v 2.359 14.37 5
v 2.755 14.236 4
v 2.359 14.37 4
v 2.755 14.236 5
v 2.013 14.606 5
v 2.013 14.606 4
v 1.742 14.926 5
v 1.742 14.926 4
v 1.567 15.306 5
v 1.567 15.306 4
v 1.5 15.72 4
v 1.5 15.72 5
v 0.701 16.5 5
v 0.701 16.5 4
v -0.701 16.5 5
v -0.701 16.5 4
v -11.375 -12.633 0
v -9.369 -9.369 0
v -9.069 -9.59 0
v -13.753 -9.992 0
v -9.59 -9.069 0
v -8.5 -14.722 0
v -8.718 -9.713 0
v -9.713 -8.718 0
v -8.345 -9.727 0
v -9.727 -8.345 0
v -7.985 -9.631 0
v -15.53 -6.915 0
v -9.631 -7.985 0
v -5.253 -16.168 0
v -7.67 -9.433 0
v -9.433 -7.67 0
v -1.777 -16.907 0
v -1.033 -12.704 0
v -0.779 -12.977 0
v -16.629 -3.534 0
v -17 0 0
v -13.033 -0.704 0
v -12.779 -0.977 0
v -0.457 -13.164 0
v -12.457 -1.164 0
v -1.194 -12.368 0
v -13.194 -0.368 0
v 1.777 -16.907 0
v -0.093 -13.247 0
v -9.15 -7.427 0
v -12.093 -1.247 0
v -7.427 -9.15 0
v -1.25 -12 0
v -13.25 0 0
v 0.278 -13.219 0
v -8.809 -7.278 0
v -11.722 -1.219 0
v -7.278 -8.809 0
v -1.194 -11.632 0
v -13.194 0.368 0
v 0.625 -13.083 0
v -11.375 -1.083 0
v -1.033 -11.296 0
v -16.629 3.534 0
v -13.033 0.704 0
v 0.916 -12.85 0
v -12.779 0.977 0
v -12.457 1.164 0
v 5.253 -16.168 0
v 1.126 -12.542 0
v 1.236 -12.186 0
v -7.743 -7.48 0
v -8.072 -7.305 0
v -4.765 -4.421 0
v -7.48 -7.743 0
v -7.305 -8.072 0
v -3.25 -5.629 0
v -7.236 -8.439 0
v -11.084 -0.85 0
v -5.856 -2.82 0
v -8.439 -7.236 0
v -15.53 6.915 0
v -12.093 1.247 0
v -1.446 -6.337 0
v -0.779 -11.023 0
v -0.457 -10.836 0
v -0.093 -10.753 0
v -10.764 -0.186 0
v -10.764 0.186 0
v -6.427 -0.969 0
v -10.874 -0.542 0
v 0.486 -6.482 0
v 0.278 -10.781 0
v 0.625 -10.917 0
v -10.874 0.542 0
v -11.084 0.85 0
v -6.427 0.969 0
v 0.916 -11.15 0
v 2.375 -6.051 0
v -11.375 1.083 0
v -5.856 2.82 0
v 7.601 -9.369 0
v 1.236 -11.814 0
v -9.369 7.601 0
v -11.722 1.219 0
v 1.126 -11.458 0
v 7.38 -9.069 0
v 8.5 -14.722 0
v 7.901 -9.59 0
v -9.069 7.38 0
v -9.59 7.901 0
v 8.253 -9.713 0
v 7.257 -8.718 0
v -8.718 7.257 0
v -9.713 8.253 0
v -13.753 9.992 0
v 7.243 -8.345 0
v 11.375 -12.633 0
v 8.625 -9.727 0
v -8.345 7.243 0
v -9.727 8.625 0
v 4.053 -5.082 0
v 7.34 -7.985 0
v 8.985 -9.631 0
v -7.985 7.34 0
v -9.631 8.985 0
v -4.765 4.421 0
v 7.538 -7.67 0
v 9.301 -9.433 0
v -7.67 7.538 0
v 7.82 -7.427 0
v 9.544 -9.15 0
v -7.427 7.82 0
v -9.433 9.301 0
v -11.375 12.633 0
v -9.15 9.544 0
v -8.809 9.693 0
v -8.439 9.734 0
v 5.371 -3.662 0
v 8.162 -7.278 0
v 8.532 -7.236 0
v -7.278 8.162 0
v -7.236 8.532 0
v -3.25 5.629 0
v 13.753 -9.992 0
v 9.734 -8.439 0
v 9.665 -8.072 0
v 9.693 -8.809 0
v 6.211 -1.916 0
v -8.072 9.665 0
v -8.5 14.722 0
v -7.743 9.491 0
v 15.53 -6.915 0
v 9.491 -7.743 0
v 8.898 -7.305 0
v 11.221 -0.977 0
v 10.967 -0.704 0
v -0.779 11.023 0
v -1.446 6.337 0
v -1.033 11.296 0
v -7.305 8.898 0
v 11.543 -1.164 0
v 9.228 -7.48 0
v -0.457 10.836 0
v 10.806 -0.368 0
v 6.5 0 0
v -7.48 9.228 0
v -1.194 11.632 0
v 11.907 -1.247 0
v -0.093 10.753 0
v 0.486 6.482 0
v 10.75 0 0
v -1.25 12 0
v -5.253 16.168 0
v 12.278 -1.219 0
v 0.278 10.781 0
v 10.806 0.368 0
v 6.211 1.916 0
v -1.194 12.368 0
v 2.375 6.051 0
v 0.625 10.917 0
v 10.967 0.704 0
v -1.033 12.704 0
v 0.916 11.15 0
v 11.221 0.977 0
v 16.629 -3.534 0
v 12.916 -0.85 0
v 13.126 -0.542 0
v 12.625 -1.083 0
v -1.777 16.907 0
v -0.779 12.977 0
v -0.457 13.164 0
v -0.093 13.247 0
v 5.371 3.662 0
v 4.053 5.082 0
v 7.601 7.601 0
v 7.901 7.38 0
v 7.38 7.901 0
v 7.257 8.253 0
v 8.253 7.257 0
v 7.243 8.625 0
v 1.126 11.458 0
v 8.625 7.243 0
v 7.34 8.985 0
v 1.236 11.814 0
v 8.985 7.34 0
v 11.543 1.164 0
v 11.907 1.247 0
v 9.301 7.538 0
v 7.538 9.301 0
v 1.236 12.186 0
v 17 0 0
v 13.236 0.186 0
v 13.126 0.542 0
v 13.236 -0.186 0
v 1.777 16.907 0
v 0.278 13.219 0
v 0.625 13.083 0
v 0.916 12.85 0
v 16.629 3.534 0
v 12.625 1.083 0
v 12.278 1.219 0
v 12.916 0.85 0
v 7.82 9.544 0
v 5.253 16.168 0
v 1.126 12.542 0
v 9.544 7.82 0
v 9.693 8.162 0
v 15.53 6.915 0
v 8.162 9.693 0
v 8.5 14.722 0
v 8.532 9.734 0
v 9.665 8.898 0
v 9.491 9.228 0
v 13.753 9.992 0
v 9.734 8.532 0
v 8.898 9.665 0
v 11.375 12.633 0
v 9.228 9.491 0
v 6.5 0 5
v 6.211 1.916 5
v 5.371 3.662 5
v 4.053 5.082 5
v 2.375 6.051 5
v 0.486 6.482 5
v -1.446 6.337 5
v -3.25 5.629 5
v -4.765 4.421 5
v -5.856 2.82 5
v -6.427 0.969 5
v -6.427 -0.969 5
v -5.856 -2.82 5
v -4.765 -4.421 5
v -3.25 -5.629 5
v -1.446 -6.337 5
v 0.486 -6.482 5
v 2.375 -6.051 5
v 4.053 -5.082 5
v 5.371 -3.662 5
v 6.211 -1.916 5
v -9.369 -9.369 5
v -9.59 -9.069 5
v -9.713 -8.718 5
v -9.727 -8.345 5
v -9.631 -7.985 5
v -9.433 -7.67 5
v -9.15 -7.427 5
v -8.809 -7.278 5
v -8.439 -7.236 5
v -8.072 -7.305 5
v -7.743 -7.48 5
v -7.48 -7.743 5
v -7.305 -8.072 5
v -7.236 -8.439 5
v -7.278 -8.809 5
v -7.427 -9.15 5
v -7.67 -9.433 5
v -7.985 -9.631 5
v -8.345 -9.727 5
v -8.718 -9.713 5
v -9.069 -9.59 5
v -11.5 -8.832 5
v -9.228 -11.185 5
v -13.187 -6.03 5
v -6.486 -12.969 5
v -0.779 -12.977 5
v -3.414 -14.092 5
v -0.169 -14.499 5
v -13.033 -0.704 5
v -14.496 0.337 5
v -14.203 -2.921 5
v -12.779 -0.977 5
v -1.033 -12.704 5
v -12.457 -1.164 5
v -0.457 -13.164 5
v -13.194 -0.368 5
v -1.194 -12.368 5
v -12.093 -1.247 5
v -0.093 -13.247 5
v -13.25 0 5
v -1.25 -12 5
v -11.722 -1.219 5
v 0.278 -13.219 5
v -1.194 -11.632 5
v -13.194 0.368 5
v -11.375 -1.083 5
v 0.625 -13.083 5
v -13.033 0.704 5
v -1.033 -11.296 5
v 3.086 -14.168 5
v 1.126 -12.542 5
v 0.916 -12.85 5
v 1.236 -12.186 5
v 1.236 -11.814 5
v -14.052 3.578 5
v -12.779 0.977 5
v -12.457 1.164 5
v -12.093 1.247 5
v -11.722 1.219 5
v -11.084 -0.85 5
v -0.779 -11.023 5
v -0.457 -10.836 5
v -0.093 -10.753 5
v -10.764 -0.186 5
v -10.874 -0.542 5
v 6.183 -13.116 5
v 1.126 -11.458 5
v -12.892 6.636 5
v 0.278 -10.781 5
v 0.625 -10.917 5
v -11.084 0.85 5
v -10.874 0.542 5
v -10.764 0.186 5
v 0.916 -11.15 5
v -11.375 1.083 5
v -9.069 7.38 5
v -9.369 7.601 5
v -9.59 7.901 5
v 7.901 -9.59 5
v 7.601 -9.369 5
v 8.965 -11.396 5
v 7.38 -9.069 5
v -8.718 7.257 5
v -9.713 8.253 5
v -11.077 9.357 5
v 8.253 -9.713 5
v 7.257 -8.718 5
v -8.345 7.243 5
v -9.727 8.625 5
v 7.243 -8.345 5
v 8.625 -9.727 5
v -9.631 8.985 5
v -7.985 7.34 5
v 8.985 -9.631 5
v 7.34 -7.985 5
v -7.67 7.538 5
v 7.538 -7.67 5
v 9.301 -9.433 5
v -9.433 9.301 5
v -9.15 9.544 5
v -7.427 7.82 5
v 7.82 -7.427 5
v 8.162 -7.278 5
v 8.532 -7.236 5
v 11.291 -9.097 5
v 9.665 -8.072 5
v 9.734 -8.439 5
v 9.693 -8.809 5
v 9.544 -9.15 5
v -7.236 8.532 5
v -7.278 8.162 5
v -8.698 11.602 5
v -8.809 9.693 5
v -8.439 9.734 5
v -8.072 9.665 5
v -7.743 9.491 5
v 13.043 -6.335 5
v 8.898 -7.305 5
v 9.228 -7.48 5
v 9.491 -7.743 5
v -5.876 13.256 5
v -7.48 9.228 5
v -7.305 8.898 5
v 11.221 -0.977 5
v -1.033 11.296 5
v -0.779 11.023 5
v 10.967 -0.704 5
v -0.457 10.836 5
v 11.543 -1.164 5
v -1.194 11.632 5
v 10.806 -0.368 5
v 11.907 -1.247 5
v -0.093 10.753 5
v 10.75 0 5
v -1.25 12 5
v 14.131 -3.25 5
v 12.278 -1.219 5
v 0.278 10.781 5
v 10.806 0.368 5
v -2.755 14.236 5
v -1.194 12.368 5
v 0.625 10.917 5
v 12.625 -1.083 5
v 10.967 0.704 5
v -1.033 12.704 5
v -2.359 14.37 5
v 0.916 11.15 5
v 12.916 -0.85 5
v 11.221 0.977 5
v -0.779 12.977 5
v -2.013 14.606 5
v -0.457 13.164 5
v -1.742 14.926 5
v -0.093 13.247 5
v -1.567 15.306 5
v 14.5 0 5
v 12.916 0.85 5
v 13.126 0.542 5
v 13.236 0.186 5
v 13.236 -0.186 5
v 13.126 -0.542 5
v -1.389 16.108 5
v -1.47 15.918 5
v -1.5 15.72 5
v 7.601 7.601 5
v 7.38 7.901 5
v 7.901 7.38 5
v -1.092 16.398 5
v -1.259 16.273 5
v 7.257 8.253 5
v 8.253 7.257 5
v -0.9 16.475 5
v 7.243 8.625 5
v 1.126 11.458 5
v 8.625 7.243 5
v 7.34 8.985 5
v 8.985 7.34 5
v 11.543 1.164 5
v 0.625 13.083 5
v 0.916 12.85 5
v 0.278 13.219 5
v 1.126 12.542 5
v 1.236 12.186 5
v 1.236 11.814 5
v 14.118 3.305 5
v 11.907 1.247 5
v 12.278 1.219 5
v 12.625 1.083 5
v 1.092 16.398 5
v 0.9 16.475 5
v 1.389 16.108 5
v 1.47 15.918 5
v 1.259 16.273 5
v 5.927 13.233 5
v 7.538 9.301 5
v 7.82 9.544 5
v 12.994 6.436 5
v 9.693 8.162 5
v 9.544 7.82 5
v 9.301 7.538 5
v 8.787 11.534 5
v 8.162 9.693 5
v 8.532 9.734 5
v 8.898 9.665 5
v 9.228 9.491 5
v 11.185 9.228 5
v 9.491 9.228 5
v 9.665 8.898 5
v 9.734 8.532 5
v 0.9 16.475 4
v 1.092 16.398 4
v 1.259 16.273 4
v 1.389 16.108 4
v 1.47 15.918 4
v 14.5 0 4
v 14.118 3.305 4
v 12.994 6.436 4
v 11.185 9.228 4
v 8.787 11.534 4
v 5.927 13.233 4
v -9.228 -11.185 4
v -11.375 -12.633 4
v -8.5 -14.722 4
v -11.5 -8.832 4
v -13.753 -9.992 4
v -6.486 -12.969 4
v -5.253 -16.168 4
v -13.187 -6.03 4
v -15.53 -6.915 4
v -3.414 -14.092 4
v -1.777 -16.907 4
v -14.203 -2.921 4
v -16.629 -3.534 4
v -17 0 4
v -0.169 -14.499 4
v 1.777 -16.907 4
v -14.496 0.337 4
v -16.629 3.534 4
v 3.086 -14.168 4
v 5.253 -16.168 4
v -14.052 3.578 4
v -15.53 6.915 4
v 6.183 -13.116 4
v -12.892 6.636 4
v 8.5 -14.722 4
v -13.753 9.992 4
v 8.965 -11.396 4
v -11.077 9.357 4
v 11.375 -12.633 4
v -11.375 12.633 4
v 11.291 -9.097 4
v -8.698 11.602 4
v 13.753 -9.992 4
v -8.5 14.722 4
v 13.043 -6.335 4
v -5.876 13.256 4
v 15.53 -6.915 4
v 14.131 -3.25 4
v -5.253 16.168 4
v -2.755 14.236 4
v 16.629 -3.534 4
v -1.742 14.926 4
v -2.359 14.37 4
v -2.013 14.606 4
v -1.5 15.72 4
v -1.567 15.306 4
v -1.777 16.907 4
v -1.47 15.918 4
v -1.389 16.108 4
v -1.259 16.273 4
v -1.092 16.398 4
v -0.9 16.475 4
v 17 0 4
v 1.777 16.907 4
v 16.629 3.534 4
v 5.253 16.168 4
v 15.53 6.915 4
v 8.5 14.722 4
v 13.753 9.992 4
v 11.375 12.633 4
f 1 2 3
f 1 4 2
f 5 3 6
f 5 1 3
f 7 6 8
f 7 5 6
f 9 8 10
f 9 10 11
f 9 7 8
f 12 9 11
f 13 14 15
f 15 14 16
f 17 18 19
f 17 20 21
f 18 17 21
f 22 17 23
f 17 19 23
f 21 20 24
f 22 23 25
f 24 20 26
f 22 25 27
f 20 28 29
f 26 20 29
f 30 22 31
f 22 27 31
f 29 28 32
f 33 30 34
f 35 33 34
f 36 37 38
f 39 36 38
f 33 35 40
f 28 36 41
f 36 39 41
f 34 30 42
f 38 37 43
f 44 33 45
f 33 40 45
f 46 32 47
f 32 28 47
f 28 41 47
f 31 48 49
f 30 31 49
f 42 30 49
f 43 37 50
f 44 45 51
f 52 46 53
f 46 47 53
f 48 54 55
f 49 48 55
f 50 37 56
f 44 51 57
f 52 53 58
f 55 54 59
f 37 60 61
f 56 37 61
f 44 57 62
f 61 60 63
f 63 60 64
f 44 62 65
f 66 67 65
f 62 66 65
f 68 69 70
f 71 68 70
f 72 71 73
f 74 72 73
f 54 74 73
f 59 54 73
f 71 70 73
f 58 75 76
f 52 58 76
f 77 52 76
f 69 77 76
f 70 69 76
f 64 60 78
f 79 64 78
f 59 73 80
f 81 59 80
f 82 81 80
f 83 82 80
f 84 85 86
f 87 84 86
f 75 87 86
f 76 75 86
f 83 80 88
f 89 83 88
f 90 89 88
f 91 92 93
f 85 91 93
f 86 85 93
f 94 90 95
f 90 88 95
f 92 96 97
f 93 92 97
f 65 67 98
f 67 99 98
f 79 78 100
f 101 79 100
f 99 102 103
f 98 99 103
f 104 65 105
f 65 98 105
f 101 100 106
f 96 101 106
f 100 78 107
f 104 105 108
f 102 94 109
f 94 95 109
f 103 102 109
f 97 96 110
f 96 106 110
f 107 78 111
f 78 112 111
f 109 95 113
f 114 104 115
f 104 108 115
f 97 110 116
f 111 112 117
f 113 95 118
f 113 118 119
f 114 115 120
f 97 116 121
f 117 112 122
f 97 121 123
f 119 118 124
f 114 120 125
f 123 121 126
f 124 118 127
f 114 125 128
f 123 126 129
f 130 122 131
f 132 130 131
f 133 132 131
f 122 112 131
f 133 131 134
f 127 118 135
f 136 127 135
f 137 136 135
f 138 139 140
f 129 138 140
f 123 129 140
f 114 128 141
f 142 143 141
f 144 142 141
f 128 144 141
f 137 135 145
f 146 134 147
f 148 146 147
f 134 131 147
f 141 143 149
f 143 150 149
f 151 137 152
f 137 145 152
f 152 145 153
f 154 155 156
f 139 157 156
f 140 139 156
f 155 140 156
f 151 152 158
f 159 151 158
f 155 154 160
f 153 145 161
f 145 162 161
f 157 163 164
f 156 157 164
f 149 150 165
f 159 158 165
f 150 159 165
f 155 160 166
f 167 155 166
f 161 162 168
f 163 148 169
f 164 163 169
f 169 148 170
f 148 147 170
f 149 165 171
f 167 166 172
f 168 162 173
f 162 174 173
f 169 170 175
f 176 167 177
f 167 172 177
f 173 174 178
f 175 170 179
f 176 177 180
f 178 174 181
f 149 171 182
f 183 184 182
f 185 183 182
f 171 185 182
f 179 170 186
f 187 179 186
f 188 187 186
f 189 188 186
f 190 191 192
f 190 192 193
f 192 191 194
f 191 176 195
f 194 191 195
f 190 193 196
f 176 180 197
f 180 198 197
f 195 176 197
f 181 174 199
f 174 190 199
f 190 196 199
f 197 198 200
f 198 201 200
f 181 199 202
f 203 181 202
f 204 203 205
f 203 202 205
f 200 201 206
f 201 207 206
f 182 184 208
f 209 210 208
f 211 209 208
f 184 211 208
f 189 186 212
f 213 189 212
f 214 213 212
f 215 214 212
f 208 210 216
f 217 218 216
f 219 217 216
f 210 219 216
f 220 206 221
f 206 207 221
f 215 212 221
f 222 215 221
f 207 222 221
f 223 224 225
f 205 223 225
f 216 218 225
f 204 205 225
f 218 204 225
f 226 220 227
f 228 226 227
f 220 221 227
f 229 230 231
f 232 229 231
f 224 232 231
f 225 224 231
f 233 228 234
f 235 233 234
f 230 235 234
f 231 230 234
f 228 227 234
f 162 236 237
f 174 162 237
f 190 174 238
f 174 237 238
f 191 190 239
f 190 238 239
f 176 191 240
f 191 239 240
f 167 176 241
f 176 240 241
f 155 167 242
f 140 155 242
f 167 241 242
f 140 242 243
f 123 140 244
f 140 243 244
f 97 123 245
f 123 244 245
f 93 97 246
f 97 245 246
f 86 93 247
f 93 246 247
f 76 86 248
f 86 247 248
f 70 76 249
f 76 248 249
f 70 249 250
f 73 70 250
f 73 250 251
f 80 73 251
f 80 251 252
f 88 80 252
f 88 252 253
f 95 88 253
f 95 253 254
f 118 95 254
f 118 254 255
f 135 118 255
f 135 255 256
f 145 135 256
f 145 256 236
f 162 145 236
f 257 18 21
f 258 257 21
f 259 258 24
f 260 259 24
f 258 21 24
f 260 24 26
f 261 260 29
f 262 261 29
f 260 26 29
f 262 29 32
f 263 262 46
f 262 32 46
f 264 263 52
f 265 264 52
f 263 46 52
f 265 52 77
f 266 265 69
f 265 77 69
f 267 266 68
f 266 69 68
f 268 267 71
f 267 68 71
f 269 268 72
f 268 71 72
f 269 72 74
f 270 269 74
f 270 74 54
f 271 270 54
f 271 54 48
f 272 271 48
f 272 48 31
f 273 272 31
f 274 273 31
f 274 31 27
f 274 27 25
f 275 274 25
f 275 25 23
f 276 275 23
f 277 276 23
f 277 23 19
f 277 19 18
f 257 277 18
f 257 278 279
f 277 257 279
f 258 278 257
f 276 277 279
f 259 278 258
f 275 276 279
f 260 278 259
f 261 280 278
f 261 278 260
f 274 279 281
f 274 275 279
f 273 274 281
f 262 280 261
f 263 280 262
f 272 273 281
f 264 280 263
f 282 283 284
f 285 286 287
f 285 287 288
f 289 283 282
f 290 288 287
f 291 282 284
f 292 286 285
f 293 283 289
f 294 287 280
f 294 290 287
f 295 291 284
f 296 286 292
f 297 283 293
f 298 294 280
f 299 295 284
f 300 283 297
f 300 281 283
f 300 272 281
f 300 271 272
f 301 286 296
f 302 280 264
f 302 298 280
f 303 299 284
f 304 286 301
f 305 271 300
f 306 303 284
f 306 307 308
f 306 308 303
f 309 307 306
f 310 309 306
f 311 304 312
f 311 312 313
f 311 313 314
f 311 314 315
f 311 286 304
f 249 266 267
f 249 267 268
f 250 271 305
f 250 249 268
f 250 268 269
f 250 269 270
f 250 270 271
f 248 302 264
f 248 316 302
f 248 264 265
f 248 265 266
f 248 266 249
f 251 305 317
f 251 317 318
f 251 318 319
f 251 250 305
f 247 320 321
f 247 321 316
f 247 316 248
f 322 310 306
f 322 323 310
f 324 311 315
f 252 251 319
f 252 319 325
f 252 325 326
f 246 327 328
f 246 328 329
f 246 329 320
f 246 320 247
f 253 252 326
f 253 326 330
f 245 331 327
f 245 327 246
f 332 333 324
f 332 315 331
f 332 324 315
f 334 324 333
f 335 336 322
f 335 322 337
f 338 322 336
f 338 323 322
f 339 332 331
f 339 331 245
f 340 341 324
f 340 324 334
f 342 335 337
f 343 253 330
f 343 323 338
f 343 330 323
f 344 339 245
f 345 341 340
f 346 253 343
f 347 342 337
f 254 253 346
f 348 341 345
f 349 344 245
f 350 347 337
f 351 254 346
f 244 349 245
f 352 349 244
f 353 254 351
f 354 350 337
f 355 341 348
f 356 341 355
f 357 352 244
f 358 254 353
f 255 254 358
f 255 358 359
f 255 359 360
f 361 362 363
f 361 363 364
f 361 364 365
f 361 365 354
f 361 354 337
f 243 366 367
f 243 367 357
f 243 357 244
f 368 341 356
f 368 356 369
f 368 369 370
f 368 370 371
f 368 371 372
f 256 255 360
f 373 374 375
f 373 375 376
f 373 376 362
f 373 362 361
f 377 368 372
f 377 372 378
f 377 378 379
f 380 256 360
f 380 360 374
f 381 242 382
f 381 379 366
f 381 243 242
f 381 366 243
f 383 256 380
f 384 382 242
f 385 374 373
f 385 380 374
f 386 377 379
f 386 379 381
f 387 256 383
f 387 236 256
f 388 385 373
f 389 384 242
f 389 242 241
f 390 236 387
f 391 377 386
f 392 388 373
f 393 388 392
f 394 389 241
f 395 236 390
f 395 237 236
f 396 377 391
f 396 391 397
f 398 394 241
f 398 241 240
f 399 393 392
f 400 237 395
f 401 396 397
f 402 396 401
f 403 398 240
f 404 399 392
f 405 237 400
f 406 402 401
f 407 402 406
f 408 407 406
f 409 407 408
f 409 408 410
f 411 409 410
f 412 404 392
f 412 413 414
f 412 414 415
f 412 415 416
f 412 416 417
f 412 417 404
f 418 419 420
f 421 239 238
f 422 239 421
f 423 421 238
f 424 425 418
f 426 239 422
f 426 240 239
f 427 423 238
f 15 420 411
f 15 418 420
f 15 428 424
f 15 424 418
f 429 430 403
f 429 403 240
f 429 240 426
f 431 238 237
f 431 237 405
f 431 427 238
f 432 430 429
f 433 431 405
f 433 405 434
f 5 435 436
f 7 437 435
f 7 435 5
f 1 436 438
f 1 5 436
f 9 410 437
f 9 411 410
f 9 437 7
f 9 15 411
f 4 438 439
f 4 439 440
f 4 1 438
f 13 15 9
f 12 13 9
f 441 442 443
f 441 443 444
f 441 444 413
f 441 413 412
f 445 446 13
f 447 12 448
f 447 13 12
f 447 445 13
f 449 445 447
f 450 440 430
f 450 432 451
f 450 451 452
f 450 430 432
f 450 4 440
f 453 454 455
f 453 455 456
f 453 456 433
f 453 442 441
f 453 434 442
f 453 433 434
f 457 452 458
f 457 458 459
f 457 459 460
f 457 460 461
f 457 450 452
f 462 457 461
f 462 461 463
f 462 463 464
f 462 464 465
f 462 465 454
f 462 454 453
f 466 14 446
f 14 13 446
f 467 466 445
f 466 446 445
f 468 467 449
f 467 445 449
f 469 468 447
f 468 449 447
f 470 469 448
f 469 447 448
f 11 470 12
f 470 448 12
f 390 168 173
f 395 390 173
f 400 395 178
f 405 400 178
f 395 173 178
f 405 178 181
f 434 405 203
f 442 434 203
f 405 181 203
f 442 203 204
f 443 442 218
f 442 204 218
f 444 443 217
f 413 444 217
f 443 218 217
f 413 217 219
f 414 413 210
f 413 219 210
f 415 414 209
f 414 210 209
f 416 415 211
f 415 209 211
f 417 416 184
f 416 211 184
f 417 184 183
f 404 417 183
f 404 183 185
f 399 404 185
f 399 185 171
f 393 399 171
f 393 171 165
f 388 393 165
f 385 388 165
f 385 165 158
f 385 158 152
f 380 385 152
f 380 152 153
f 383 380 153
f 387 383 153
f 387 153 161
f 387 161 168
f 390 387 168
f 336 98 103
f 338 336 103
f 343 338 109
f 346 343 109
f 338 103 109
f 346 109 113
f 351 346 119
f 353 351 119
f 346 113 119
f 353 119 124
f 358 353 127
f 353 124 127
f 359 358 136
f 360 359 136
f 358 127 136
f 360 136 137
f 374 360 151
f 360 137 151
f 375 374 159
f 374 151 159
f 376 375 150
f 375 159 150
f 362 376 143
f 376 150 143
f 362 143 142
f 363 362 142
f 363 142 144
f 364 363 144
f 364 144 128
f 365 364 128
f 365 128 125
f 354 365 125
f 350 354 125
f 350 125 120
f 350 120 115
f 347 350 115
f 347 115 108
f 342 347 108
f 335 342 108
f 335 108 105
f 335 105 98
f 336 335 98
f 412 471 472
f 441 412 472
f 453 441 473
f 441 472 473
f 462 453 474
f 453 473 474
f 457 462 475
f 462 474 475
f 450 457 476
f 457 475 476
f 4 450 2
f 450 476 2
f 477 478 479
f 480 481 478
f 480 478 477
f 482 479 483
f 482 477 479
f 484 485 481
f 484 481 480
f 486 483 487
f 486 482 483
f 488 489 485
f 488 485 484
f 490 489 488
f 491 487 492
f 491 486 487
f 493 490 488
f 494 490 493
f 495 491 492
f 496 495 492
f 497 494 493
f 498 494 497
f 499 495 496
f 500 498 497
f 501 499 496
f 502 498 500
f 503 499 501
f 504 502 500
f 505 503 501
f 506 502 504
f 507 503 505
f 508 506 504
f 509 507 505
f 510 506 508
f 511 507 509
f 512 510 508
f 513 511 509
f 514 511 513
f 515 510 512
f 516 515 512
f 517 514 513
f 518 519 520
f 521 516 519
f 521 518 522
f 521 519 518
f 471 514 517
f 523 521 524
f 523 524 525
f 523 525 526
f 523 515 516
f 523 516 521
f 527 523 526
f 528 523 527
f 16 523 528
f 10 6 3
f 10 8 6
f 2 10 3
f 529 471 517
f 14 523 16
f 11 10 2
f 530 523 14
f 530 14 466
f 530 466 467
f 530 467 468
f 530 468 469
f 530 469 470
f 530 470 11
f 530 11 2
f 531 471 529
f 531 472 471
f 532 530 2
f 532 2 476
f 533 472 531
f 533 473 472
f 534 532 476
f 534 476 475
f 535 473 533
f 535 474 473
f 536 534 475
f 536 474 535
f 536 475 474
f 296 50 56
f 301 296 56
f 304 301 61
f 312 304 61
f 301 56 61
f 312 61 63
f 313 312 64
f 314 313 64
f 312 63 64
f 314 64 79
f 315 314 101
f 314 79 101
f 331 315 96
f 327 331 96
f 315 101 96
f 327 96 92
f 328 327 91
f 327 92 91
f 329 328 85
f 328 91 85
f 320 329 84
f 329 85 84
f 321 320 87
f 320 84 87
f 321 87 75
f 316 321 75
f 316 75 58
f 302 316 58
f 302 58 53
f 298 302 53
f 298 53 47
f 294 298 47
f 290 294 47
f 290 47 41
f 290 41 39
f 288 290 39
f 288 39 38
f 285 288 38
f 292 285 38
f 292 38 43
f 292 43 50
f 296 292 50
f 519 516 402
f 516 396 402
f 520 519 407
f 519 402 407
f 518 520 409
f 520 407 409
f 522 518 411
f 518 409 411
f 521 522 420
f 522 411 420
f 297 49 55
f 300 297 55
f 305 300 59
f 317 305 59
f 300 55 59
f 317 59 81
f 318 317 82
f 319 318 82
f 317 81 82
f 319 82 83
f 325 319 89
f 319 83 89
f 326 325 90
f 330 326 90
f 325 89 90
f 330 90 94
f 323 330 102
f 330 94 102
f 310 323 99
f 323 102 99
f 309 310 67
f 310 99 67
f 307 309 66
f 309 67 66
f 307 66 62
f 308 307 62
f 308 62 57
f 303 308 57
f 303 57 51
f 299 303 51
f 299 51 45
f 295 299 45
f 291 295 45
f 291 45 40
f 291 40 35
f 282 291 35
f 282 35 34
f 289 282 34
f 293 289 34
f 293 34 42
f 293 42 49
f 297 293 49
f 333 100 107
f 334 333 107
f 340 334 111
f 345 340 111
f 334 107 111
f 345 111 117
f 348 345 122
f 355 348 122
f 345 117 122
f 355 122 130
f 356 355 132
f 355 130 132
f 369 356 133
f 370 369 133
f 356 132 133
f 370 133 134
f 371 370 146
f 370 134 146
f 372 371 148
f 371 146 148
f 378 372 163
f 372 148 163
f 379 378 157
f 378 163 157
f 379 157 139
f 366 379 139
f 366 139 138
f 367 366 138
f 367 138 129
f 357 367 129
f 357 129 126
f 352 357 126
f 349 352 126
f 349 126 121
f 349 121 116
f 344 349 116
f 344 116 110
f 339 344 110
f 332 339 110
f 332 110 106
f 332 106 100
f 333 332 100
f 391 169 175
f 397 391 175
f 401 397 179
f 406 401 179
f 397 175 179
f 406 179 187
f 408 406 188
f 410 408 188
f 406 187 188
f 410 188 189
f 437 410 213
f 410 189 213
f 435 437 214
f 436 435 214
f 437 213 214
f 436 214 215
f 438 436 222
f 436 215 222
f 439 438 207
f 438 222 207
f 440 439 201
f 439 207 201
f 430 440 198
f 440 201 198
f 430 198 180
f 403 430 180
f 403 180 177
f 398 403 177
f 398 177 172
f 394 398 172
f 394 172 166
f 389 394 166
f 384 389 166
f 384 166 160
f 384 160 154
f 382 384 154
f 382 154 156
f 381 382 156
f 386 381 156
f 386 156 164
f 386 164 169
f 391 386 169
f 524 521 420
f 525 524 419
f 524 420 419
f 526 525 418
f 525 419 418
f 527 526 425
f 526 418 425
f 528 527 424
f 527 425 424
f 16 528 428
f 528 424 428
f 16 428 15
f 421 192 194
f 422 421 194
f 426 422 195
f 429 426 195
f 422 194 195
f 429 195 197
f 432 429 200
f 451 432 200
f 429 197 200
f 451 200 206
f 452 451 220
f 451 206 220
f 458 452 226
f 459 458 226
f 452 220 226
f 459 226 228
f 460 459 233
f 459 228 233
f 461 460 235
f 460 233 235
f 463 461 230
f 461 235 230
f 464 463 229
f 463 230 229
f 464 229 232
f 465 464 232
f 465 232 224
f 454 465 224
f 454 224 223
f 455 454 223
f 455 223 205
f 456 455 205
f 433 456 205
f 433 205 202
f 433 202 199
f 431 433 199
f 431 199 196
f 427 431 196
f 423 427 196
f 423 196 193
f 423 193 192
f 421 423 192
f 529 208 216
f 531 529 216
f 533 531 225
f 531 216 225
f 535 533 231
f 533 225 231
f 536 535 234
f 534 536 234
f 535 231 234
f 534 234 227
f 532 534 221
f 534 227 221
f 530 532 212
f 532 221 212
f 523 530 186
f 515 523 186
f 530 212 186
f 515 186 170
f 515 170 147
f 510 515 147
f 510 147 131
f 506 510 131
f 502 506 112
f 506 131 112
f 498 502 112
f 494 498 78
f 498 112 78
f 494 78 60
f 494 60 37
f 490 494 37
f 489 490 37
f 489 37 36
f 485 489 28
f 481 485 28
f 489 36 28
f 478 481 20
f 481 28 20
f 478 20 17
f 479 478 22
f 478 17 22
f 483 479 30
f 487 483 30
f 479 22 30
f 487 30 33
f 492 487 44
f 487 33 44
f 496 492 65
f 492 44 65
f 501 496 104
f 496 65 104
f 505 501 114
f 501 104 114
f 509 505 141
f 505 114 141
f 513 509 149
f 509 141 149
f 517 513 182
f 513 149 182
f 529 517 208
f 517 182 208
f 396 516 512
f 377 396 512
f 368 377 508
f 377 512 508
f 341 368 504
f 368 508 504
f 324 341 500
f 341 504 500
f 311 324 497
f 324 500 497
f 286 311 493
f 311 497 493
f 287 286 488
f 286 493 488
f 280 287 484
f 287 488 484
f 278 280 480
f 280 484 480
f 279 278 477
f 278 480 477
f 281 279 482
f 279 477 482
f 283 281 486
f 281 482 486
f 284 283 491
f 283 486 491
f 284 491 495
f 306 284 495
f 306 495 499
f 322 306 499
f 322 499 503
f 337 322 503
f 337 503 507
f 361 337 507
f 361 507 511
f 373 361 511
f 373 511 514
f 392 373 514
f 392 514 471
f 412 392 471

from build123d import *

# Parameters (mm, degrees)
SKETCH_1_R               = 17
EXTRUDE_1_DEPTH          = 4
EXTRUDE_2_DEPTH          = 1
FILLET_1_R               = 1.55
FILLET_2_R               = 0.8
SKETCH_3_R               = 6.5
CUT_EXTRUDE_1_DEPTH      = 6
SKETCH_4_R               = 1.25
CUT_EXTRUDE_2_DEPTH      = 6.0000001
PATTERN_CIRCULAR_1_COUNT = 2
PATTERN_CIRCULAR_1_ANGLE = 45


with BuildPart() as part:
    # ｽｹｯﾁ1 → ﾎﾞｽ - 押し出し1 (new body)
    with BuildSketch(Plane.XY):
        Circle(SKETCH_1_R)
    extrude(amount=EXTRUDE_1_DEPTH)

    # ｽｹｯﾁ2 → ﾎﾞｽ - 押し出し2 (add)
    with BuildSketch(Plane.XY.offset(4)):
        with BuildLine():
            Line((-1.5, 14.422205102), (-1.5, 12.5))
            Line((-1.5, 12.5), (1.5, 12.5))
            Line((1.5, 12.5), (1.5, 14.422205102))
            ThreePointArc((1.5, 14.422205102), (0, 14.5), (-1.5, 14.422205102))
        make_face()
        with BuildLine():
            Line((1.5, 12.5), (-1.5, 12.5))
            Line((-1.5, 12.5), (-1.5, 14.422205102))
            ThreePointArc((-1.5, 14.422205102), (-9.708243919, -10.770329614), (14.5, 0))
            ThreePointArc((14.5, 0), (10.770329614, 9.708243919), (1.5, 14.422205102))
            Line((1.5, 14.422205102), (1.5, 12.5))
        make_face()
        with BuildLine():
            Line((-1.5, 16.5), (-1.5, 14.422205102))
            ThreePointArc((-1.5, 14.422205102), (0, 14.5), (1.5, 14.422205102))
            Line((1.5, 14.422205102), (1.5, 16.5))
            Line((1.5, 16.5), (-1.5, 16.5))
        make_face()
    extrude(amount=EXTRUDE_2_DEPTH)

    # ﾌｨﾚｯﾄ1
    fillet_1_edges = [part.edges().sort_by_distance(p)[0] for p in [
        (-1.5, 14.422205102, 4.5),
        (1.5, 14.422205102, 4.5),
    ]]
    fillet(fillet_1_edges, radius=FILLET_1_R)

    # ﾌｨﾚｯﾄ2
    fillet_2_edges = [part.edges().sort_by_distance(p)[0] for p in [
        (1.5, 16.5, 4.5),
        (-1.5, 16.5, 4.5),
    ]]
    fillet(fillet_2_edges, radius=FILLET_2_R)

    # ｽｹｯﾁ3 → ｶｯﾄ - 押し出し1 (cut, through all)
    with BuildSketch(Plane.XY.offset(5)):
        Circle(SKETCH_3_R)
    extrude(amount=-CUT_EXTRUDE_1_DEPTH, mode=Mode.SUBTRACT)

    # ｽｹｯﾁ4 → ｶｯﾄ - 押し出し2 (cut, through all)
    with BuildSketch(Plane(origin=(0, 0, 0), x_dir=(-1, 0, 0), z_dir=(0, 0, -1))):
        with Locations((0, 12)):
            Circle(SKETCH_4_R)
        with Locations((12, 0)):
            Circle(SKETCH_4_R)
        with Locations((0, -12)):
            Circle(SKETCH_4_R)
        with Locations((-12, 0)):
            Circle(SKETCH_4_R)
    cut_extrude_2 = extrude(amount=-CUT_EXTRUDE_2_DEPTH, mode=Mode.SUBTRACT)

    # 円形ﾊﾟﾀｰﾝ1: ｶｯﾄ - 押し出し2 ×2 about axis
    pattern_circular_1_axis = Axis((0, 0, 0), (0, 0, 1))
    for i in range(1, PATTERN_CIRCULAR_1_COUNT):
        add(cut_extrude_2.rotate(pattern_circular_1_axis, i * PATTERN_CIRCULAR_1_ANGLE / (PATTERN_CIRCULAR_1_COUNT - 1)), mode=Mode.SUBTRACT)


solid = part.part
